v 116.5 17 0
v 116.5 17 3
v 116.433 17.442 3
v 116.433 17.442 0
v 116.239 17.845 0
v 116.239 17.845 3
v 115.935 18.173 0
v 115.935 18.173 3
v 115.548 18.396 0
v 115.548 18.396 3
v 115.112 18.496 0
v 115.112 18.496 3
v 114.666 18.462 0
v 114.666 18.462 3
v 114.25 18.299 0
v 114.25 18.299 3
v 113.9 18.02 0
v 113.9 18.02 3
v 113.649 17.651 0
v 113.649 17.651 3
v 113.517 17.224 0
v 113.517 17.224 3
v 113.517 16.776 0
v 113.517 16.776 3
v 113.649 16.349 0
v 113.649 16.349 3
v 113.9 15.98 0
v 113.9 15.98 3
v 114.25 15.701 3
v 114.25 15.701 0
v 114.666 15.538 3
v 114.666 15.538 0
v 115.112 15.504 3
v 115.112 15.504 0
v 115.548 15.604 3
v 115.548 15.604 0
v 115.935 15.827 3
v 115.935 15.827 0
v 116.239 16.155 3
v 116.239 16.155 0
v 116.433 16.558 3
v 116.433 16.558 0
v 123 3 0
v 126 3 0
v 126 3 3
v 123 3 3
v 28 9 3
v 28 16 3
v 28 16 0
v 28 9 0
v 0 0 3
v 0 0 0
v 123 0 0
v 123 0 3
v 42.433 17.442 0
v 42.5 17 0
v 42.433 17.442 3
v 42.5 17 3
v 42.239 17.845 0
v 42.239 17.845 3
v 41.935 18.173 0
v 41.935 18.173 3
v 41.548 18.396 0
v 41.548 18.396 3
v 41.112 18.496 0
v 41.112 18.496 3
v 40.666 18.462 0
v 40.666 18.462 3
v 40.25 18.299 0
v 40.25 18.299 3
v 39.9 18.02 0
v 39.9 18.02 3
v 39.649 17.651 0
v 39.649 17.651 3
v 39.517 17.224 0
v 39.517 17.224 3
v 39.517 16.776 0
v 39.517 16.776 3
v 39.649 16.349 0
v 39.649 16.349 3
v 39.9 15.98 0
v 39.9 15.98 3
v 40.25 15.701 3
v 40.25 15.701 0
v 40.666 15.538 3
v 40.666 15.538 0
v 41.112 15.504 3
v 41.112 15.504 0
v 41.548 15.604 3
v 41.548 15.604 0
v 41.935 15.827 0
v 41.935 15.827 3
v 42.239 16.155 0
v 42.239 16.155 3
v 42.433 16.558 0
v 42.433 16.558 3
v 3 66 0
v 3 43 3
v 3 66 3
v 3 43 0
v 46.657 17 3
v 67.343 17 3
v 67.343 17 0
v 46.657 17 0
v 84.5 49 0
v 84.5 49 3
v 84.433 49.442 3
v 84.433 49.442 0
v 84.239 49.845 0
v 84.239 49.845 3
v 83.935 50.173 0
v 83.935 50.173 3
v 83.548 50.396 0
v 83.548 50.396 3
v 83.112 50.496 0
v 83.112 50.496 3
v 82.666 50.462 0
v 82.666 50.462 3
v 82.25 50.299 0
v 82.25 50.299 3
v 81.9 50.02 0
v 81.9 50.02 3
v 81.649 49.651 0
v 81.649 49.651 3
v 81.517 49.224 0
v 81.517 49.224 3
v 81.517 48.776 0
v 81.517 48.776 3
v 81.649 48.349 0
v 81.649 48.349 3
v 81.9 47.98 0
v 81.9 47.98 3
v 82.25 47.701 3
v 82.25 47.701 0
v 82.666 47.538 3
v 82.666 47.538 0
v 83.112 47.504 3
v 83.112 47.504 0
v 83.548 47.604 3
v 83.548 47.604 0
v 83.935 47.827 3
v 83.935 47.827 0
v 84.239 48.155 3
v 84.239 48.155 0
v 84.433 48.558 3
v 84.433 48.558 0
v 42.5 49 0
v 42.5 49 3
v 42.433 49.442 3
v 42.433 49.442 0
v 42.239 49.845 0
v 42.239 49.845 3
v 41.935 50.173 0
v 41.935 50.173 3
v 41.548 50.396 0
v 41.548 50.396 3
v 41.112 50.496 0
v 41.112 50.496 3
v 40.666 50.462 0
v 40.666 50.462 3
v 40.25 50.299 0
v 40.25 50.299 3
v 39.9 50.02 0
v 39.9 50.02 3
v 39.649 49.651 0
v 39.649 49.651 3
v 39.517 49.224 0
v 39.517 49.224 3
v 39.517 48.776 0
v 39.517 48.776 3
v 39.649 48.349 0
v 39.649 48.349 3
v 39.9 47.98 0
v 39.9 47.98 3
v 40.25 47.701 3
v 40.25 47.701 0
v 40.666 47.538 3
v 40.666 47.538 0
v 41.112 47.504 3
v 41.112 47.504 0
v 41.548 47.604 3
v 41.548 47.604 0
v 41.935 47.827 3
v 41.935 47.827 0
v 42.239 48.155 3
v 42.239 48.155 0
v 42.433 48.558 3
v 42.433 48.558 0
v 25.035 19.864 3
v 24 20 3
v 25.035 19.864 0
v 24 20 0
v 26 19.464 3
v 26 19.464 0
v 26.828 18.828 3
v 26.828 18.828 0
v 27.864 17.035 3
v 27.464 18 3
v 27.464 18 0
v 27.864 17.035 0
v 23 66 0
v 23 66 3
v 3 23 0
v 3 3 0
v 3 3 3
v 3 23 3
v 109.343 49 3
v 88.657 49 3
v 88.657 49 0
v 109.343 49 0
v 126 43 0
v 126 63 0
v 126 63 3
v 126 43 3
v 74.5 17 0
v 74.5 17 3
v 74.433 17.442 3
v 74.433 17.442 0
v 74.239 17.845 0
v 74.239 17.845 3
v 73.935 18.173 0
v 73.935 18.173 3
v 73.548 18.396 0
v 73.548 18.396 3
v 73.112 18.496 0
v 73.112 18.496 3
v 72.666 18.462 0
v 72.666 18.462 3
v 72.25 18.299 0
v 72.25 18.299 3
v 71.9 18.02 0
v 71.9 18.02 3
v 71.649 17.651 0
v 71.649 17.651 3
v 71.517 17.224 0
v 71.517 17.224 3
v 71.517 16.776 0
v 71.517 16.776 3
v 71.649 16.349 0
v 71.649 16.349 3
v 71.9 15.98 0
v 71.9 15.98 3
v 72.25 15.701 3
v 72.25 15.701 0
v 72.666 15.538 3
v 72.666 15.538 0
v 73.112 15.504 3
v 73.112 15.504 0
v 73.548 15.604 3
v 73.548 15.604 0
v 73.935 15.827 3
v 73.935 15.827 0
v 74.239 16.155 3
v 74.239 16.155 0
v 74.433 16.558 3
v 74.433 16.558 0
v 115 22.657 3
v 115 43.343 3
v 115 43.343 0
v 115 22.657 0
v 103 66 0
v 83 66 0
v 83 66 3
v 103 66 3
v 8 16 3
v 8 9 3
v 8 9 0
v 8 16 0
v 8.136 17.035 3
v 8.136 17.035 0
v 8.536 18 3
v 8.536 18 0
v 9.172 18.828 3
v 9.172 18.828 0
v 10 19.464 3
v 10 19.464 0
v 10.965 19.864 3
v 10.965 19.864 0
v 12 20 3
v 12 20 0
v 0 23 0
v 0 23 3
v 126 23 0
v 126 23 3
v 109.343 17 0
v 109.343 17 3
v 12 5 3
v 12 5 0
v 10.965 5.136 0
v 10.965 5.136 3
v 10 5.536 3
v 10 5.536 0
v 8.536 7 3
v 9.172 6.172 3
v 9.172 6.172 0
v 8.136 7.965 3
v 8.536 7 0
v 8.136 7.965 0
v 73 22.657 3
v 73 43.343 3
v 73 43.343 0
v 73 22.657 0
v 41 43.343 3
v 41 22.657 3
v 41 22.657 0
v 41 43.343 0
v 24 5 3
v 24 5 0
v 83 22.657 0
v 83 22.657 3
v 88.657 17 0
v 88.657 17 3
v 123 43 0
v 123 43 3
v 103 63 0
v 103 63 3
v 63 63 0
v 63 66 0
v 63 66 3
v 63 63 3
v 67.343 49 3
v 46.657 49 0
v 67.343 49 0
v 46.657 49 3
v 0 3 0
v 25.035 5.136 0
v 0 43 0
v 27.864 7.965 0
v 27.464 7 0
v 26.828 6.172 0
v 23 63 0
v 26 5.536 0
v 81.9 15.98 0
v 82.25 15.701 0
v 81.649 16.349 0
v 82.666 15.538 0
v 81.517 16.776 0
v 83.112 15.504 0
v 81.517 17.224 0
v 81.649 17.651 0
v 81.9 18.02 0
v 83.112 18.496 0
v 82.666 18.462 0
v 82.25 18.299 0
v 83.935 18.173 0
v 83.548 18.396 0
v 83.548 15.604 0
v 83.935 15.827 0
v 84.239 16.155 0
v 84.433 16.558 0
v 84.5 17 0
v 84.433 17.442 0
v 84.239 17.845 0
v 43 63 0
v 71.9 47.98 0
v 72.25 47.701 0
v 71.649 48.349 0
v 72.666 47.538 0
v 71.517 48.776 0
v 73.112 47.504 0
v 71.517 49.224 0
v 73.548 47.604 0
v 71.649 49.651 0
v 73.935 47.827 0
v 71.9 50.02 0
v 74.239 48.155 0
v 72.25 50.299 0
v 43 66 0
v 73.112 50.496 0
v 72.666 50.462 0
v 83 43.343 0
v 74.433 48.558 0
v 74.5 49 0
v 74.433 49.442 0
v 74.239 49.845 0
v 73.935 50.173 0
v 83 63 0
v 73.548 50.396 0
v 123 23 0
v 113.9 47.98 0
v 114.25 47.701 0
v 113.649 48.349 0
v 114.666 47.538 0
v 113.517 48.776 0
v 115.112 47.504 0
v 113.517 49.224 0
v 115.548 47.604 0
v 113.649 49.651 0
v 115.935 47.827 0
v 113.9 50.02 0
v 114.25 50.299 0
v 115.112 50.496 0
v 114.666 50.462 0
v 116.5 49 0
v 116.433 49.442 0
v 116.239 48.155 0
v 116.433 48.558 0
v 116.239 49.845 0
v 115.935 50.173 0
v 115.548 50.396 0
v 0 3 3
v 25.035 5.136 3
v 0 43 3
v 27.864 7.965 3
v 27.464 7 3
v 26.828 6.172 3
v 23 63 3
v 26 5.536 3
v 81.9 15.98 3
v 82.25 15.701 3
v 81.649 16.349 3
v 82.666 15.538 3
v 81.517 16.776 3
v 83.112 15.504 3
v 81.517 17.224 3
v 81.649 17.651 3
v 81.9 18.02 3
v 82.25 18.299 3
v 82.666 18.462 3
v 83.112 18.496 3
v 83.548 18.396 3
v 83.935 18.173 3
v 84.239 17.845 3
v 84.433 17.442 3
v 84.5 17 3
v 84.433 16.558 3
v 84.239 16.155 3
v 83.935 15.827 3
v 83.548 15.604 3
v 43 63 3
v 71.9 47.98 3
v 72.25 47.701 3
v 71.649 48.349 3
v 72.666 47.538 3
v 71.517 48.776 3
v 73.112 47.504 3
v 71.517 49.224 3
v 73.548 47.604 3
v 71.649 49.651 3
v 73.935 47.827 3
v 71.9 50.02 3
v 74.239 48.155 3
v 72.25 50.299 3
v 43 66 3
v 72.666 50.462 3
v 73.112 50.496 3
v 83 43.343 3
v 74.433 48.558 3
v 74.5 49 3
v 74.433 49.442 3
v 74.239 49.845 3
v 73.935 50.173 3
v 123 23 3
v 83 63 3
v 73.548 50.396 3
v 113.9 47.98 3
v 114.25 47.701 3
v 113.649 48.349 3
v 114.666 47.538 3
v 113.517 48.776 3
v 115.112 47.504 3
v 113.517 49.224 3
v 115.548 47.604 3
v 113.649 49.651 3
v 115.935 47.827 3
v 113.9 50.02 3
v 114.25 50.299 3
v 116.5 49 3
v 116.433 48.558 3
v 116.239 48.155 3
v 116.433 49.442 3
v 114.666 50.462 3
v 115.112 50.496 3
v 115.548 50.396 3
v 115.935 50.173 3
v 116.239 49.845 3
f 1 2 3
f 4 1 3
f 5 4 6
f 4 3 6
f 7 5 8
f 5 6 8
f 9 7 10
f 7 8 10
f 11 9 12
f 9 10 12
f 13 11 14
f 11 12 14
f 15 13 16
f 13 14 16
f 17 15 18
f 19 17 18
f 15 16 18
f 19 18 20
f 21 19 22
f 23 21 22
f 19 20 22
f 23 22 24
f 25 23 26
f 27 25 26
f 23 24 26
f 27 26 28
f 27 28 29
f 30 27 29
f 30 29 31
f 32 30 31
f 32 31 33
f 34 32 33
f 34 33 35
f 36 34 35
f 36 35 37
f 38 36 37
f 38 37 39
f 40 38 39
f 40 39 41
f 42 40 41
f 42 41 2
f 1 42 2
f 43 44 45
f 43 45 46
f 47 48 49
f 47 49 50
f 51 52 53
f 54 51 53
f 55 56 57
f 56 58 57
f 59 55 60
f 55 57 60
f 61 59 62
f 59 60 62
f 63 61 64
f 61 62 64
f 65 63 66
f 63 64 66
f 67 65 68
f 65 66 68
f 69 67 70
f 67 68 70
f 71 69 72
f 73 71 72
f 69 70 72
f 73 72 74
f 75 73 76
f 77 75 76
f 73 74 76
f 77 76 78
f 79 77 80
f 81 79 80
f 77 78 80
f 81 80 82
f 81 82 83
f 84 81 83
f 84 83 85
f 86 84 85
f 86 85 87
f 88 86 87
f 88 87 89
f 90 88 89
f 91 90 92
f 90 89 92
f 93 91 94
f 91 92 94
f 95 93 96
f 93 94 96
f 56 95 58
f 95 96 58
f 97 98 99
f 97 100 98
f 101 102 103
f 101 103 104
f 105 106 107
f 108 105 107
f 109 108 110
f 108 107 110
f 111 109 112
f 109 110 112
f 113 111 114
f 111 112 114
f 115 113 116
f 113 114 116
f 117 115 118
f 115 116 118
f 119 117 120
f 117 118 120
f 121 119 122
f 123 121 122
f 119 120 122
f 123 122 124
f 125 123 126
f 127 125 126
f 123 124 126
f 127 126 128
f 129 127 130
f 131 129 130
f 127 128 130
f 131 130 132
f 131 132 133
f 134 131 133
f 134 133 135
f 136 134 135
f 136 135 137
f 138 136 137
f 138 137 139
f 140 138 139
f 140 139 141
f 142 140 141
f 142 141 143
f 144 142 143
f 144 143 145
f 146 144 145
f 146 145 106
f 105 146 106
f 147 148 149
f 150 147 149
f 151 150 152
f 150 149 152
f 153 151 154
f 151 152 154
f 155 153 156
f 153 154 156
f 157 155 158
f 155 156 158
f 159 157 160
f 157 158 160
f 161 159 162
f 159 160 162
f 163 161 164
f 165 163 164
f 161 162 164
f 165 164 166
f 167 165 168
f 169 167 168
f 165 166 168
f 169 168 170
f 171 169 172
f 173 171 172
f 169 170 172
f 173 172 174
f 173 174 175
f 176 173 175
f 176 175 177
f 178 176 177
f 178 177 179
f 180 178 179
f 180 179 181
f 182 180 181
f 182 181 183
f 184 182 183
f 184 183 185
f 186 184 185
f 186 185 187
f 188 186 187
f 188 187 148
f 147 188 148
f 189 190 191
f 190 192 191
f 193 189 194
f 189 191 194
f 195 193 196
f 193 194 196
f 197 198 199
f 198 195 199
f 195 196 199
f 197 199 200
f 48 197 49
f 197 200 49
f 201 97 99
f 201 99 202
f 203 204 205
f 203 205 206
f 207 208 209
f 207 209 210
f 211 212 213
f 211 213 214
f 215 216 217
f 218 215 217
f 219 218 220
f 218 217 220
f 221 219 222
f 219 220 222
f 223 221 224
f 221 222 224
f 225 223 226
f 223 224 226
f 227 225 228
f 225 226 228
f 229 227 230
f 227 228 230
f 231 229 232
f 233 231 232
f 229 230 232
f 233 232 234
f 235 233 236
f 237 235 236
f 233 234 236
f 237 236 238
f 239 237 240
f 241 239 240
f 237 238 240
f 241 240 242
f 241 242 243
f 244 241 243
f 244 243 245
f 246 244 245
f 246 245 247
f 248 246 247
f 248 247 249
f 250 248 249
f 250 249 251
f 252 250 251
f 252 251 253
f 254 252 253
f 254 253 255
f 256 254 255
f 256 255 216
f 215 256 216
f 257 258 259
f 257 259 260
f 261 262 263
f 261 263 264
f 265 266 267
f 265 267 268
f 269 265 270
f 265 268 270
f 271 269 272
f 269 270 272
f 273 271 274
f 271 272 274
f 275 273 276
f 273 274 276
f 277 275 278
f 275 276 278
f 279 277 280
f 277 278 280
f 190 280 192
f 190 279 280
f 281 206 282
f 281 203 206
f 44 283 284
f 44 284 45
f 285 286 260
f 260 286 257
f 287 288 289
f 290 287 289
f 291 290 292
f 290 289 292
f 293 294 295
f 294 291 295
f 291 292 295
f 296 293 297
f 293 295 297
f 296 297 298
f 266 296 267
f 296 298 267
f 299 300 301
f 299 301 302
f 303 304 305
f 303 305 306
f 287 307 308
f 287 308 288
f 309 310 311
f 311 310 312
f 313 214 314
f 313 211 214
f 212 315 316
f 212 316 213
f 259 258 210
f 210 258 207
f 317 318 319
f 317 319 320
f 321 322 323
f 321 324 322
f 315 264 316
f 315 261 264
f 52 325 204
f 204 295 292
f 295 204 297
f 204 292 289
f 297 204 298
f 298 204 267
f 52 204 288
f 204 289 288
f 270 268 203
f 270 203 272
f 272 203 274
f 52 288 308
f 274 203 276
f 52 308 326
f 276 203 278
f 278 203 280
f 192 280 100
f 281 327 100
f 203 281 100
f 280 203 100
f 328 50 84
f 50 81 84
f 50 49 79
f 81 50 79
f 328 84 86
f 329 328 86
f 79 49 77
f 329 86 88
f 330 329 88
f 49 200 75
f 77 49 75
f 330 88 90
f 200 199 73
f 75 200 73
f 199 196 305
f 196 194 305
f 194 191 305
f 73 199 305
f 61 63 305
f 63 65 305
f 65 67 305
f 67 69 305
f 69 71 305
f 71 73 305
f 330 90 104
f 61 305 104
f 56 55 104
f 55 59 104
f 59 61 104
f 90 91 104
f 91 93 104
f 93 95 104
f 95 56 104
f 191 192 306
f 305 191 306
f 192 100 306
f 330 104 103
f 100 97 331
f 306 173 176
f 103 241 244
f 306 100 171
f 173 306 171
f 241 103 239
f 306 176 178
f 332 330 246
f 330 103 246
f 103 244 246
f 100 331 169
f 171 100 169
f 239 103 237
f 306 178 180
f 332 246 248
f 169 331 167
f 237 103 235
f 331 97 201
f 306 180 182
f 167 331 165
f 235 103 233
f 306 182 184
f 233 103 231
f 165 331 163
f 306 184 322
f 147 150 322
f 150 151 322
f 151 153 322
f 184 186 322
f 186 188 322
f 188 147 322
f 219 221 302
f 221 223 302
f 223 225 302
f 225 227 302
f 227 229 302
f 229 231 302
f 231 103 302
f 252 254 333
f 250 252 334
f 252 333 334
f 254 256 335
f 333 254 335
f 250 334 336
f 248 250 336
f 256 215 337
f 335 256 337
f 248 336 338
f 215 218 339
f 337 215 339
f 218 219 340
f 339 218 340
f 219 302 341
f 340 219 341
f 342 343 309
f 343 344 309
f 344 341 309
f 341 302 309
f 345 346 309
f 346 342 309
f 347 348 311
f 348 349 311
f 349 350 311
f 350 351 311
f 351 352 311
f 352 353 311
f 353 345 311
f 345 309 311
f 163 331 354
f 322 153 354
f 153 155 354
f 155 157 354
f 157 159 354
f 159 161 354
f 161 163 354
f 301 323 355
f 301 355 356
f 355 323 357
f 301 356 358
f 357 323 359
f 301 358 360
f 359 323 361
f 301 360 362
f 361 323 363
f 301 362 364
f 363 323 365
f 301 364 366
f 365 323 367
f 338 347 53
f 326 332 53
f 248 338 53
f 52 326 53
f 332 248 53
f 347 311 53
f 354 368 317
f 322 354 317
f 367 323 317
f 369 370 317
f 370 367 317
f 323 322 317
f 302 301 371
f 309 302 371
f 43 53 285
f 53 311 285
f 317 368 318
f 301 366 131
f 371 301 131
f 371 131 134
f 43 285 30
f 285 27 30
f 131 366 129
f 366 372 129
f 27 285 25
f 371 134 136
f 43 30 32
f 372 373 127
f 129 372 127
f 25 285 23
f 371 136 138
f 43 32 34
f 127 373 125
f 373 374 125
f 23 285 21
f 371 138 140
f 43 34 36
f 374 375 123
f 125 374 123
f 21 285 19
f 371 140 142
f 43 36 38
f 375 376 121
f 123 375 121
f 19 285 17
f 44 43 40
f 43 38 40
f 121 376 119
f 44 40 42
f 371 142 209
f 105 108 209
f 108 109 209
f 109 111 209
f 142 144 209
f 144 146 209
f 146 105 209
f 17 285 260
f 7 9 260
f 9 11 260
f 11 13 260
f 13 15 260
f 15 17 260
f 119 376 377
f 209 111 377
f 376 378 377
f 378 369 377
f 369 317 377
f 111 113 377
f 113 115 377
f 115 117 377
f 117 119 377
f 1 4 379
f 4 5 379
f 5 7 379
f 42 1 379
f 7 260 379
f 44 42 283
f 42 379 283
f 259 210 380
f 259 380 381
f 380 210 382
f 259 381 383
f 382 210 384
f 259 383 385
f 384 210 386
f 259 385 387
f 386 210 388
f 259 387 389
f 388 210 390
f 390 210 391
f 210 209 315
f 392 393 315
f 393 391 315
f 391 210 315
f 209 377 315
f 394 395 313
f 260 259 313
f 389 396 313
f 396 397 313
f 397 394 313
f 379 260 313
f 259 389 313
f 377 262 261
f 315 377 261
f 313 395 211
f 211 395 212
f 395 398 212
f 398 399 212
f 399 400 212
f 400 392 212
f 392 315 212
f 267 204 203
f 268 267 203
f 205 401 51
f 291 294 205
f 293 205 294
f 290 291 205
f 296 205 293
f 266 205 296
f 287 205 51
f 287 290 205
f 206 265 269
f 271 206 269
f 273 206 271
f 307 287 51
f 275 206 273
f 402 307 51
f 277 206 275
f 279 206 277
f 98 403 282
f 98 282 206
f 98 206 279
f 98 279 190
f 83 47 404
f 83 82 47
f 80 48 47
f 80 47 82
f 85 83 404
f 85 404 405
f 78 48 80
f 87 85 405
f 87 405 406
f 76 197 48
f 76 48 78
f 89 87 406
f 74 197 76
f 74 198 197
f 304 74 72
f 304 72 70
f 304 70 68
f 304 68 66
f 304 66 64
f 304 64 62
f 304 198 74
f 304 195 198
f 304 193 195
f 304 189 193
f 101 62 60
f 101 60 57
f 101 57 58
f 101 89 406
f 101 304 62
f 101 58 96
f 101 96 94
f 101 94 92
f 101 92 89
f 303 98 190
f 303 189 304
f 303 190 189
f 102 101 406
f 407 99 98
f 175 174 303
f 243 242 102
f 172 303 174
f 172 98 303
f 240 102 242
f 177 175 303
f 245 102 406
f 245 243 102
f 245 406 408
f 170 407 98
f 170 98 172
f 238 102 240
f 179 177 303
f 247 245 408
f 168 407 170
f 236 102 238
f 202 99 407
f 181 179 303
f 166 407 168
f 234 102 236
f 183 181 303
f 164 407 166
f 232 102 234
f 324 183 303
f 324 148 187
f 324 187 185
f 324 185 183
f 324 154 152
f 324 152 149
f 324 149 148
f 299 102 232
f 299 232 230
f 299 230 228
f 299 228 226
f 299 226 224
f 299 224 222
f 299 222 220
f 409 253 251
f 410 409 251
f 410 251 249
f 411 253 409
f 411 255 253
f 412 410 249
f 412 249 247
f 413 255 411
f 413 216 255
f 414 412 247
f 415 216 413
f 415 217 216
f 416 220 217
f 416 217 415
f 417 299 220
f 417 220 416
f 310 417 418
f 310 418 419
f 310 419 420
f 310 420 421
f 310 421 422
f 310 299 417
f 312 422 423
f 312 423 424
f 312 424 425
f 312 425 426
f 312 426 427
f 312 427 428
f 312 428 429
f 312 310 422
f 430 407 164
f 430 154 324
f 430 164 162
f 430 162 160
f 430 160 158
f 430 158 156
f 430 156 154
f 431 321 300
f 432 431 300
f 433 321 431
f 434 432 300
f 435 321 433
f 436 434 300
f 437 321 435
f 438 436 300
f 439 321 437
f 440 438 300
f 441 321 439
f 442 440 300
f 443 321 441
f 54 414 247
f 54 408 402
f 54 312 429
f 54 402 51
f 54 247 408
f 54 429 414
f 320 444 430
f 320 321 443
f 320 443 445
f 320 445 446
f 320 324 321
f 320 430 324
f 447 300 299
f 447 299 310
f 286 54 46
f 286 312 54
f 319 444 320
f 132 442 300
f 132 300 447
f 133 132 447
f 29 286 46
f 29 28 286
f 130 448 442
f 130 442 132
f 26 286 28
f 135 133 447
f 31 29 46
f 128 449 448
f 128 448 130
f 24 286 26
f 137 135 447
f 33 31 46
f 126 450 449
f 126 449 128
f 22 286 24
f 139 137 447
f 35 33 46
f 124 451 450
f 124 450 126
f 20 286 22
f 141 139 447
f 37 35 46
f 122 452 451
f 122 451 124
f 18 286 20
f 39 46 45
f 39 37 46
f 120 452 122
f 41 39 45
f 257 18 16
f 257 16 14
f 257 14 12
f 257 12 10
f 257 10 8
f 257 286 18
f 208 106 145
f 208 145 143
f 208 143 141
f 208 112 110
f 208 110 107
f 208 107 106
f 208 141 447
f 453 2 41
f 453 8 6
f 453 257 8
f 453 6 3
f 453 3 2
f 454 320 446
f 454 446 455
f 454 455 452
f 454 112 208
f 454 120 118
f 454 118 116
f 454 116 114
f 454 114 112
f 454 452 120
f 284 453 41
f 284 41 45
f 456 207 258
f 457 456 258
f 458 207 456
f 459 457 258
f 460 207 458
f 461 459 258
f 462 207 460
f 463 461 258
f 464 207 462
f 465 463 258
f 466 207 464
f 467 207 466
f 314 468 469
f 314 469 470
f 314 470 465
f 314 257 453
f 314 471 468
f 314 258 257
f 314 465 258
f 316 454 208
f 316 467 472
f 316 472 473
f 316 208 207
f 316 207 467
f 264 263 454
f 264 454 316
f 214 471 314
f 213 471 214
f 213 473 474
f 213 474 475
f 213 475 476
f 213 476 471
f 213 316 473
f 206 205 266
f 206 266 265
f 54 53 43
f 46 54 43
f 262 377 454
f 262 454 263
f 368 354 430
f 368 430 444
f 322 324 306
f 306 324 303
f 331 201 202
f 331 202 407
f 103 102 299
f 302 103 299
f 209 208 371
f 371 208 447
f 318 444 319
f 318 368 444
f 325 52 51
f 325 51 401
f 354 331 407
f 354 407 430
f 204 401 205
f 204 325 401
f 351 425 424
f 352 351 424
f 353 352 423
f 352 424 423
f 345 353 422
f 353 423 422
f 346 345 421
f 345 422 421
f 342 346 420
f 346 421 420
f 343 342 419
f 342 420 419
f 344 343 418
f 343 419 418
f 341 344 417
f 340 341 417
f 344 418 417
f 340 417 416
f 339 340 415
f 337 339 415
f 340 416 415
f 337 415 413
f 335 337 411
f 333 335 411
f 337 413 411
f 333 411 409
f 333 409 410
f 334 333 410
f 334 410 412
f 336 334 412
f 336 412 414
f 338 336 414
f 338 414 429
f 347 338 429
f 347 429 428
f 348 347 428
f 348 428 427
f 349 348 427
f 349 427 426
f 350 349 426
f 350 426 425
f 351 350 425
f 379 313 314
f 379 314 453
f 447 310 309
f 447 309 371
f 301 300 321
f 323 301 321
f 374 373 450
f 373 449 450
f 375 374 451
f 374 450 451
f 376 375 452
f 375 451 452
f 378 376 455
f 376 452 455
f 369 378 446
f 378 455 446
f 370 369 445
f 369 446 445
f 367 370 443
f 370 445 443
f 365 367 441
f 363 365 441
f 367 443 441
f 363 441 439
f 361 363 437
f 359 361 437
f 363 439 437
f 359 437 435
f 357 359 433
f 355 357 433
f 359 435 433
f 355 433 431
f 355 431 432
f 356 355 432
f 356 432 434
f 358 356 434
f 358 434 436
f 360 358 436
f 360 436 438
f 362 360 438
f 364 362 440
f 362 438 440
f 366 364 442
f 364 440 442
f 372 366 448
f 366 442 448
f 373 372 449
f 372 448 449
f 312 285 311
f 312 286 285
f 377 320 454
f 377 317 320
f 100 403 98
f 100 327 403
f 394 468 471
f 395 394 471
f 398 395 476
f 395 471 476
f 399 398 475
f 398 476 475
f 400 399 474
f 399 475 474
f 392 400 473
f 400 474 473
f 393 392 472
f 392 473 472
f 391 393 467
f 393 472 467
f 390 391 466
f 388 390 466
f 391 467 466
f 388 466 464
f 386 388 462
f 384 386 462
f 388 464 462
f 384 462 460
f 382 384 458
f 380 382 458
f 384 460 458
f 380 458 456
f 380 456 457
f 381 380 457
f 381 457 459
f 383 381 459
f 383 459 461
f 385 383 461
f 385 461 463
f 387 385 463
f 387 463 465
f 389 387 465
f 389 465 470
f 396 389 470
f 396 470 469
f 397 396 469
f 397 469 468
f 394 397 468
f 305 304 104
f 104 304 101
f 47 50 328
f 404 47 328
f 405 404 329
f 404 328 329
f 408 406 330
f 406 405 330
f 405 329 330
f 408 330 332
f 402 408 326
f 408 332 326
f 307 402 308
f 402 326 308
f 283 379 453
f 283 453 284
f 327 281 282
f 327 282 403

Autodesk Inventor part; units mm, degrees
ref_plane "YZ Plane" through (0, 0, 0) normal (1, 0, 0) x (0, 1, 0)
ref_plane "XZ Plane" through (0, 0, 0) normal (0, 1, 0) x (-1, 0, 0)
ref_plane "XY Plane" through (0, 0, 0) normal (0, 0, 1) x (1, 0, 0)
sketch "Sketch1" plane through (0, 0, 0) normal (0, 0, 1) x (1, 0, 0)
  line L0 (0, 0) -> (3, 0)
  line L1 (3, 0) -> (123, 0)
  line L2 (0, 0) -> (0, 3)
  line L3 (0, 3) -> (3, 3)
  line L4 (3, 3) -> (3, 23)
  line L5 (3, 23) -> (0, 23)
  line L6 (0, 23) -> (0, 43)
  line L7 (0, 43) -> (3, 43)
  line L8 (3, 43) -> (3, 63)
  line L9 (3, 63) -> (3, 66)
  line L10 (3, 66) -> (23, 66)
  line L11 (23, 66) -> (23, 63)
  line L12 (23, 63) -> (43, 63)
  line L13 (43, 63) -> (43, 66)
  line L14 (43, 66) -> (63, 66)
  line L15 (63, 66) -> (63, 63)
  line L16 (63, 63) -> (83, 63)
  line L17 (83, 63) -> (83, 66)
  line L18 (83, 66) -> (103, 66)
  line L19 (103, 66) -> (103, 63)
  line L20 (103, 63) -> (123, 63)
  line L21 (123, 63) -> (126, 63)
  line L22 (126, 63) -> (126, 43)
  line L23 (126, 43) -> (123, 43)
  line L24 (123, 43) -> (123, 23)
  line L25 (123, 23) -> (126, 23)
  line L26 (126, 23) -> (126, 3)
  line L27 (126, 3) -> (123, 3)
  line L28 (123, 0) -> (123, 3)
  dimension "d0" = 3
  dimension "d1" = 120
  dimension "d2" = 3
  dimension "d3" = 20
  dimension "d4" = 20
  dimension "d5" = 20
  dimension "d6" = 3
  dimension "d7" = 20
  dimension "d8" = 20
  dimension "d9" = 20
  dimension "d10" = 20
  dimension "d11" = 20
  dimension "d12" = 20
  dimension "d13" = 3
  dimension "d14" = 20
  dimension "d15" = 20
  dimension "d16" = 20
extrude "Extrusion1" add sketch "Sketch1" along normal blind 3
sketch "Sketch2" plane through (0, 0, 3) normal (0, 0, 1) x (1, 0, 0)
  line L0 (83, 49) -> (115, 49)
  line L1 (115, 49) -> (115, 17)
  line L2 (115, 17) -> (83, 17)
  line L3 (83, 17) -> (83, 49)
  line L4 (83, 49) -> (115, 17) construction
  line L5 (115, 49) -> (83, 17) construction
  line L6 (123, 23) -> (123, 43) construction
  circle A0 centre (83, 49) radius 1.5
  circle A1 centre (83, 17) radius 1.5
  circle A2 centre (115, 17) radius 1.5
  circle A3 centre (115, 49) radius 1.5
  line L7 (88.6569, 49) -> (83, 43.3431)
  line L8 (83, 22.6569) -> (88.6569, 17)
  line L9 (109.3431, 17) -> (115, 22.6569)
  line L10 (115, 43.3431) -> (109.3431, 49)
  point P0 (0, 0)
  point P1 (99, 33)
  point P2 (115, 33)
  point P3 (123, 33)
  dimension "d19" = 32
  dimension "d20" = 32
  dimension "d21" = 8
  dimension "d26" = 3
  dimension "d27" = 45
  dimension "d28" = 4
extrude "Extrusion2" cut sketch "Sketch2" against normal through all contours L3 A0 L0 | L0 A0 L3 | L0 L10 L1 L9 L2 L8 L3 L7 | A3 L1 L0 | L0 L1 A3 | A1 L2 L3 | L3 L2 A1 | A2 L2 L1 | L1 L2 A2
pattern_linear "Rectangular Pattern1" count 2 spacing 42 along (-1, 0, 0) of "Extrusion2"
sketch "Sketch3" plane through (0, 0, 3) normal (0, 0, 1) x (1, 0, 0)
  line L0 (8, 20) -> (28, 20)
  line L1 (28, 20) -> (28, 5)
  line L2 (28, 5) -> (8, 5)
  line L3 (8, 5) -> (8, 20)
  line L4 (0, 0) -> (123, 0) projected
  line L5 (3, 23) -> (3, 3) projected
  dimension "d34" = 15
  dimension "d35" = 5
  dimension "d36" = 5
  dimension "d37" = 20
extrude "Extrusion3" cut sketch "Sketch3" against normal through all
fillet "Fillet1" radius 4 4 edges at (28, 5, 1.5) (28, 20, 1.5) (8, 20, 1.5) (8, 5, 1.5)
properties part number "ControlBoxFace" material "Wood (Birch)"
